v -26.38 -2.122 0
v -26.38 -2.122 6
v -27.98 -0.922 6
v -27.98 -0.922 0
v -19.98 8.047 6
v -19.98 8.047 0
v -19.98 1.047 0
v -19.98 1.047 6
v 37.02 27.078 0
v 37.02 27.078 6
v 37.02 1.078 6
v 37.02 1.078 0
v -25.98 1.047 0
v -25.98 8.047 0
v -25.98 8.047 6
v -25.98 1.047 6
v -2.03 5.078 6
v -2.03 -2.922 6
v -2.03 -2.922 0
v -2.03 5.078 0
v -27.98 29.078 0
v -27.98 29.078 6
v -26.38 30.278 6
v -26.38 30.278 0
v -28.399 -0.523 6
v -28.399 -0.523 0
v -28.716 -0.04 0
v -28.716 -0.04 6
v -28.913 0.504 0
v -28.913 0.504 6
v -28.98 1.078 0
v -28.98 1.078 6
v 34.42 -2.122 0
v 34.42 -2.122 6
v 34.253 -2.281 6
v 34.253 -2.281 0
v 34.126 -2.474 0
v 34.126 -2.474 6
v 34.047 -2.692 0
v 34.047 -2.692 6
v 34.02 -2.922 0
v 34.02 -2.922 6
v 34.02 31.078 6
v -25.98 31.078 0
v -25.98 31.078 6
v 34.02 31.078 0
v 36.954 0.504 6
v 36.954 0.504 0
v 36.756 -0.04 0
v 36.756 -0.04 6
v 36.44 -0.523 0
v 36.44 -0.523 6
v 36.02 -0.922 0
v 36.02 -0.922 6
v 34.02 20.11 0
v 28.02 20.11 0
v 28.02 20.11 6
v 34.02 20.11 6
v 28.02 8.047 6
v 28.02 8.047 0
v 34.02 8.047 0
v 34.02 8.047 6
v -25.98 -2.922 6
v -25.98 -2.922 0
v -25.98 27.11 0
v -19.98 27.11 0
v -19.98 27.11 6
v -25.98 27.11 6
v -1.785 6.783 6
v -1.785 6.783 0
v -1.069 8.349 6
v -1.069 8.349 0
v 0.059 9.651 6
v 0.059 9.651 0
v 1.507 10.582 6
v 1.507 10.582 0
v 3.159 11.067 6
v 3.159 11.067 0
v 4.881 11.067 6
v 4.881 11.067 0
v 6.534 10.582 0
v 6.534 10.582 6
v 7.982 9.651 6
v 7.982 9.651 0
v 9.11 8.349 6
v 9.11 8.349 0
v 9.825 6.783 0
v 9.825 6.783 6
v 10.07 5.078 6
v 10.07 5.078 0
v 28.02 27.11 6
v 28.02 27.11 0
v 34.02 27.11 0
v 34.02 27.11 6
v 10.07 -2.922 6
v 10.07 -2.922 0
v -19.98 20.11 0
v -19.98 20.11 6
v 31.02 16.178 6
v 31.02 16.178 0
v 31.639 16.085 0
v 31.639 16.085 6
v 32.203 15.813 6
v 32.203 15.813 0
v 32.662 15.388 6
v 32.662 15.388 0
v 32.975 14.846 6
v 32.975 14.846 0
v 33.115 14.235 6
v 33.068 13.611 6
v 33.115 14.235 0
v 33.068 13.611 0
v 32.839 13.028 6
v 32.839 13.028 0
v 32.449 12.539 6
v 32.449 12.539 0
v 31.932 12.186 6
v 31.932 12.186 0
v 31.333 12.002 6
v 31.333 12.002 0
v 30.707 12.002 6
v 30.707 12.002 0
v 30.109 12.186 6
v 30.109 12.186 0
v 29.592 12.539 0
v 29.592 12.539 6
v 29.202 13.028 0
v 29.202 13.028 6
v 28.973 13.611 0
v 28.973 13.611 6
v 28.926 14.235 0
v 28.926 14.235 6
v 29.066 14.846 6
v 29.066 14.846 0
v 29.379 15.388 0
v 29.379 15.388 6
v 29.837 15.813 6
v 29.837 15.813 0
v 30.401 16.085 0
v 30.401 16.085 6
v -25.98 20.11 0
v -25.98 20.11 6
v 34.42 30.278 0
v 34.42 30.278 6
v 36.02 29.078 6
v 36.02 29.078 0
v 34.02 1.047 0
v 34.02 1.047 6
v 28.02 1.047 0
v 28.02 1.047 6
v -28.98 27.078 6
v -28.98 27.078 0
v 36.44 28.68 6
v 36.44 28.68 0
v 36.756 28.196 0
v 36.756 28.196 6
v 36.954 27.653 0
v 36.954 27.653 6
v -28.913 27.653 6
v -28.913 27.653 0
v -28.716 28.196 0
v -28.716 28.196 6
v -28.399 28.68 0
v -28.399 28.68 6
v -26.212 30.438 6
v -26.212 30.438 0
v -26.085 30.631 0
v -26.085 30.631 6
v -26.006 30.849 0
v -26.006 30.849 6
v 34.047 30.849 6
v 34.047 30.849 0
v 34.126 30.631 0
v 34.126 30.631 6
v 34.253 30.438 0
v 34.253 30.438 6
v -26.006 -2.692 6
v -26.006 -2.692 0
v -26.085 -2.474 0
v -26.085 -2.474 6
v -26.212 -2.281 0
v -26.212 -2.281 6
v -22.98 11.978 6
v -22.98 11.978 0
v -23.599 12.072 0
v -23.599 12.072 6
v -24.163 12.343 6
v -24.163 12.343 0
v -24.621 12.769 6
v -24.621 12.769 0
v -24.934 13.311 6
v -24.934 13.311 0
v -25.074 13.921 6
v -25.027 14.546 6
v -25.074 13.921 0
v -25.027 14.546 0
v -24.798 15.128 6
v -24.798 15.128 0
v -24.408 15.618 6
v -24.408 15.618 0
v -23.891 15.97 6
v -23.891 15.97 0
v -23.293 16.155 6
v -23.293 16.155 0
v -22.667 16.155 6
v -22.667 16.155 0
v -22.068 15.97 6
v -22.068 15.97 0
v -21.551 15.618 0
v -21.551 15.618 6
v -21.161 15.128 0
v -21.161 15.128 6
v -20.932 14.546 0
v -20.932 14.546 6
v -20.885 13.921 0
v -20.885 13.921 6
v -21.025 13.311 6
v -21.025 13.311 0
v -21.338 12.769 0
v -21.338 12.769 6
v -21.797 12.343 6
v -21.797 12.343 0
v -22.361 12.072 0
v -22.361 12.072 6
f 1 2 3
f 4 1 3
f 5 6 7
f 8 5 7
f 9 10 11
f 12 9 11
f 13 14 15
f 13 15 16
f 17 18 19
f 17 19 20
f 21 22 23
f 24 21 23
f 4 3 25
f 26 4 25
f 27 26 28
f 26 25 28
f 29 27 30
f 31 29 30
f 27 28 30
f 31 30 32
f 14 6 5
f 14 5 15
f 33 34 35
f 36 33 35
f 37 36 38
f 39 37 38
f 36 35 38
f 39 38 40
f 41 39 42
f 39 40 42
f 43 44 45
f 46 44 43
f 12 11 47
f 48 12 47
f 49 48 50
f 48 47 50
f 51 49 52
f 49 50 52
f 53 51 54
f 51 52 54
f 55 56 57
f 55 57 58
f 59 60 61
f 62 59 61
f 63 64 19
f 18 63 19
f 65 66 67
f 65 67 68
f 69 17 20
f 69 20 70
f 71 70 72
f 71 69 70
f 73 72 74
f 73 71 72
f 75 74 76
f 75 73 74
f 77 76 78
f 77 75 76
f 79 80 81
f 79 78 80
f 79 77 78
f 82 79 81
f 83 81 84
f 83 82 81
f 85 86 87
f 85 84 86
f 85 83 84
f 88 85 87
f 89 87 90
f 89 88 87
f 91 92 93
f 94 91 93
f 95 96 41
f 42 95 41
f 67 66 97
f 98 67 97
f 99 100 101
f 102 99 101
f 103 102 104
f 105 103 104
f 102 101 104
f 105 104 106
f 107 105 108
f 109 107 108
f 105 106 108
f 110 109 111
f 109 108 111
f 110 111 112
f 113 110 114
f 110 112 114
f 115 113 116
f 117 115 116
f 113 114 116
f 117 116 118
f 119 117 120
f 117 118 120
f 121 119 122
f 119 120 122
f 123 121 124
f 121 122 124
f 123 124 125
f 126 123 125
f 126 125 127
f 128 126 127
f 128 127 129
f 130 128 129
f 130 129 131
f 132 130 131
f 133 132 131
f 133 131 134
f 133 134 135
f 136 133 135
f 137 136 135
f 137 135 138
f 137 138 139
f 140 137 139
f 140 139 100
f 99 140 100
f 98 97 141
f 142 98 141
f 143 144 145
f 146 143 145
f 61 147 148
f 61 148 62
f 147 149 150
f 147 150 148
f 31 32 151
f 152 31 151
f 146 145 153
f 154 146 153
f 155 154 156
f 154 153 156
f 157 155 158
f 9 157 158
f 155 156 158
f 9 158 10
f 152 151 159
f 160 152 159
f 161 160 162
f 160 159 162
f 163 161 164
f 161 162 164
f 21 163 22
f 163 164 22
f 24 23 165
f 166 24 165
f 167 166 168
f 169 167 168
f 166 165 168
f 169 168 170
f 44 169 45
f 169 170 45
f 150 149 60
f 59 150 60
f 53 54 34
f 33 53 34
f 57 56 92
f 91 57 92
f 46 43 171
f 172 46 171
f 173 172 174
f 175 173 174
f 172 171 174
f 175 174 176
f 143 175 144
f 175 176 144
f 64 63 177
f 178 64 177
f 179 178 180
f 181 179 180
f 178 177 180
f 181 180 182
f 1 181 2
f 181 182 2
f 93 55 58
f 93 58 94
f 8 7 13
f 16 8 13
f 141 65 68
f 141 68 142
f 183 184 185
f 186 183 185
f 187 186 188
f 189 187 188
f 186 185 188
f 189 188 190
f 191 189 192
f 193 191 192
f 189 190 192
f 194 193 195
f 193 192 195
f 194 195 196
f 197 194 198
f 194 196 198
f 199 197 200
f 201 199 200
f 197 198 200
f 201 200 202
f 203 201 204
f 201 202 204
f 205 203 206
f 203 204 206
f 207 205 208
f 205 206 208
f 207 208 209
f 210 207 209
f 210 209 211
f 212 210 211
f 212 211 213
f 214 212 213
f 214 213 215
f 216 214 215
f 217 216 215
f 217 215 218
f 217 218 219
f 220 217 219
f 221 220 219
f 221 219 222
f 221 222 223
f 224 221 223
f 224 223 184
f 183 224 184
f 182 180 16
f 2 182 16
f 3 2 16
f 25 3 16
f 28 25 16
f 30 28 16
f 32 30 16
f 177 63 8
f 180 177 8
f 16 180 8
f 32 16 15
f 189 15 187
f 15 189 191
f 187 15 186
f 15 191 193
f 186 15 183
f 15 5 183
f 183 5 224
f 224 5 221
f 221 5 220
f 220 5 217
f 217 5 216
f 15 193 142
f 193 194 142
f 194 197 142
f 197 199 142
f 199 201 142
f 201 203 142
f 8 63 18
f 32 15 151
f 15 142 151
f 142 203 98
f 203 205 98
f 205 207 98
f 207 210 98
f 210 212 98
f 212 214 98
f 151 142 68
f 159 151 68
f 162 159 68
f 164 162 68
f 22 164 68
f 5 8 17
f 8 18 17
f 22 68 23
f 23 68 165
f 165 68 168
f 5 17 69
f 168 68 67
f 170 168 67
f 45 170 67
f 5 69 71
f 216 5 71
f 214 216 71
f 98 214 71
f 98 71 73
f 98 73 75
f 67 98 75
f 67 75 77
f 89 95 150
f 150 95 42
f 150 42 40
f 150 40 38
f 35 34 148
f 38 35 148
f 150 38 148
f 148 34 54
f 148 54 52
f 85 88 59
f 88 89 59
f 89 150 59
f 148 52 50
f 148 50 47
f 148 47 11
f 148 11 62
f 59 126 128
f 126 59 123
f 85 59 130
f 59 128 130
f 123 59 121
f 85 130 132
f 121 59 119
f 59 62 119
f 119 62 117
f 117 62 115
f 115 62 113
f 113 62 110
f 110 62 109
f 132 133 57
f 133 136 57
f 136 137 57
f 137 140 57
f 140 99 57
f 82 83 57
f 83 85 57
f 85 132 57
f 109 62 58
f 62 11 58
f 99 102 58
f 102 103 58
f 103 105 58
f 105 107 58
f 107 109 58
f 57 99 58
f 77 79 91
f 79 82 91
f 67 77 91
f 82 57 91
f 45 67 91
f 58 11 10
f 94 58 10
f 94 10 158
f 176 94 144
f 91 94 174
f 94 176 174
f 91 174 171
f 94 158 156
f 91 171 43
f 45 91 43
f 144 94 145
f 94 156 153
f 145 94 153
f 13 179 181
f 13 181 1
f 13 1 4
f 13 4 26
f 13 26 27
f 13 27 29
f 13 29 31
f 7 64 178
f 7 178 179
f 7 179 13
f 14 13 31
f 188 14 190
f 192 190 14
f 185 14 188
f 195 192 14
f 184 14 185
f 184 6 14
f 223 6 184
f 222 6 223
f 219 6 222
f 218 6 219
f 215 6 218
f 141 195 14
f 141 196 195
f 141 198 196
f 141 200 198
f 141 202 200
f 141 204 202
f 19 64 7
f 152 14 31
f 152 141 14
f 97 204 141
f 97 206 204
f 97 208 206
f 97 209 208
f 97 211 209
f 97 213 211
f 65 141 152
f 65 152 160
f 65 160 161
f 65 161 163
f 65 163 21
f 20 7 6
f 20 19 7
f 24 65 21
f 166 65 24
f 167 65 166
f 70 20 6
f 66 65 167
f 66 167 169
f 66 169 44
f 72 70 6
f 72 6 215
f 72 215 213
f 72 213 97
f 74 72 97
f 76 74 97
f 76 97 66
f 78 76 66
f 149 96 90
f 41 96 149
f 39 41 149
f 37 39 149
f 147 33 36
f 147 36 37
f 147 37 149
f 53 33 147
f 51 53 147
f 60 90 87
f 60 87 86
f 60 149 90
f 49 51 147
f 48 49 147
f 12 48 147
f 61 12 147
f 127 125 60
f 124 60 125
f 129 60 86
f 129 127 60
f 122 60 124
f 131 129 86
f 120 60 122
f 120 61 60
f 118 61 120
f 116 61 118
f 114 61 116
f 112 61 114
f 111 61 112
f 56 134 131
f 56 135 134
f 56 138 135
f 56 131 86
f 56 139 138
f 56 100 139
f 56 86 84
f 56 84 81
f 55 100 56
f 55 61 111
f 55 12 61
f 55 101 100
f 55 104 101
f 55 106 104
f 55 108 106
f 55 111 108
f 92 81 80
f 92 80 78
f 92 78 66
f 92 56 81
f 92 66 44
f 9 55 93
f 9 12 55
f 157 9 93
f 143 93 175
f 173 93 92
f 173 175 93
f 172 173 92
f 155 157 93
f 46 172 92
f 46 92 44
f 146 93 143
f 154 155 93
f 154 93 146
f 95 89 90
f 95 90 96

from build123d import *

# Parameters (mm, degrees)
SKETCH_1_W           = 60
SKETCH_1_H           = 34
EXTRUDE_1_DEPTH      = 6
CUT_EXTRUDE_1_DEPTH  = 7
EXTRUDE_2_DEPTH      = 6
SKETCH_3_R           = 2.1
SKETCH_3_W           = 7
SKETCH_3_H           = 6
CUT_EXTRUDE_11_DEPTH = 7
EXTRUDE_21_DEPTH     = 6
SKETCH_31_R          = 2.1
SKETCH_31_W          = 7
SKETCH_31_H          = 6
CUT_EXTRUDE_12_DEPTH = 7


with BuildPart() as part:
    # Эскиз1 → Бобышка-Вытянуть1 (new body)
    with BuildSketch(Plane.XY):
        with Locations((4.02043073, 14.078379342)):
            Rectangle(SKETCH_1_W, SKETCH_1_H)
    extrude(amount=EXTRUDE_1_DEPTH)

    # Эскиз2 → Вырез-Вытянуть1 (cut, through all)
    with BuildSketch(Plane.XY.offset(6)):
        with BuildLine():
            Line((-2.02956927, -2.921620658), (-2.02956927, 5.078379342))
            ThreePointArc((-2.02956927, 5.078379342), (4.02043073, 11.128379342), (10.07043073, 5.078379342))
            Line((10.07043073, 5.078379342), (10.07043073, -2.921620658))
            ThreePointArc((10.07043073, -2.921620658), (4.02043073, -8.971620658), (-2.02956927, -2.921620658))
        make_face()
    extrude(amount=-CUT_EXTRUDE_1_DEPTH, mode=Mode.SUBTRACT)

    # Эскиз21 → Бобышка-Вытянуть2 (add)
    with BuildSketch(Plane(origin=(24.02043073, 14.078379342, 6), x_dir=(0, -1, 0), z_dir=(0, 0, -1))):
        with BuildLine():
            Line((13, 53), (-13, 53))
            ThreePointArc((-13, 53), (-14.118033989, 52.736067977), (-15, 52))
            Line((-15, 52), (-16.2, 50.4))
            ThreePointArc((-16.2, 50.4), (-16.552786405, 50.105572809), (-17, 50))
            Line((-17, 50), (17, 50))
            ThreePointArc((17, 50), (16.552786405, 50.105572809), (16.2, 50.4))
            Line((16.2, 50.4), (15, 52))
            ThreePointArc((15, 52), (14.118033989, 52.736067977), (13, 53))
        make_face()
    extrude(amount=EXTRUDE_2_DEPTH)

    # Эскиз3 → Вырез-Вытянуть11 (cut, through all)
    with BuildSketch(Plane(origin=(24.02043073, 14.078379342, 0), x_dir=(0, -1, 0), z_dir=(0, 0, -1))):
        with Locations((0, 47)):
            Circle(SKETCH_3_R)
        with Locations((9.531849908, 47)):
            Rectangle(SKETCH_3_W, SKETCH_3_H)
        with Locations((-9.531849908, 47)):
            Rectangle(SKETCH_3_W, SKETCH_3_H)
    extrude(amount=-CUT_EXTRUDE_11_DEPTH, mode=Mode.SUBTRACT)

    # Эскиз22 → Бобышка-Вытянуть21 (add)
    with BuildSketch(Plane(origin=(-15.97956927, 14.078379342, 6), x_dir=(0, 1, 0), z_dir=(0, 0, -1))):
        with BuildLine():
            Line((13, 53), (-13, 53))
            ThreePointArc((-13, 53), (-14.118033989, 52.736067977), (-15, 52))
            Line((-15, 52), (-16.2, 50.4))
            ThreePointArc((-16.2, 50.4), (-16.552786405, 50.105572809), (-17, 50))
            Line((-17, 50), (17, 50))
            ThreePointArc((17, 50), (16.552786405, 50.105572809), (16.2, 50.4))
            Line((16.2, 50.4), (15, 52))
            ThreePointArc((15, 52), (14.118033989, 52.736067977), (13, 53))
        make_face()
    extrude(amount=EXTRUDE_21_DEPTH)

    # Эскиз31 → Вырез-Вытянуть12 (cut, through all)
    with BuildSketch(Plane(origin=(-15.97956927, 14.078379342, 0), x_dir=(0, 1, 0), z_dir=(0, 0, -1))):
        with Locations((0, 47)):
            Circle(SKETCH_31_R)
        with Locations((9.531849908, 47)):
            Rectangle(SKETCH_31_W, SKETCH_31_H)
        with Locations((-9.531849908, 47)):
            Rectangle(SKETCH_31_W, SKETCH_31_H)
    extrude(amount=-CUT_EXTRUDE_12_DEPTH, mode=Mode.SUBTRACT)


solid = part.part
